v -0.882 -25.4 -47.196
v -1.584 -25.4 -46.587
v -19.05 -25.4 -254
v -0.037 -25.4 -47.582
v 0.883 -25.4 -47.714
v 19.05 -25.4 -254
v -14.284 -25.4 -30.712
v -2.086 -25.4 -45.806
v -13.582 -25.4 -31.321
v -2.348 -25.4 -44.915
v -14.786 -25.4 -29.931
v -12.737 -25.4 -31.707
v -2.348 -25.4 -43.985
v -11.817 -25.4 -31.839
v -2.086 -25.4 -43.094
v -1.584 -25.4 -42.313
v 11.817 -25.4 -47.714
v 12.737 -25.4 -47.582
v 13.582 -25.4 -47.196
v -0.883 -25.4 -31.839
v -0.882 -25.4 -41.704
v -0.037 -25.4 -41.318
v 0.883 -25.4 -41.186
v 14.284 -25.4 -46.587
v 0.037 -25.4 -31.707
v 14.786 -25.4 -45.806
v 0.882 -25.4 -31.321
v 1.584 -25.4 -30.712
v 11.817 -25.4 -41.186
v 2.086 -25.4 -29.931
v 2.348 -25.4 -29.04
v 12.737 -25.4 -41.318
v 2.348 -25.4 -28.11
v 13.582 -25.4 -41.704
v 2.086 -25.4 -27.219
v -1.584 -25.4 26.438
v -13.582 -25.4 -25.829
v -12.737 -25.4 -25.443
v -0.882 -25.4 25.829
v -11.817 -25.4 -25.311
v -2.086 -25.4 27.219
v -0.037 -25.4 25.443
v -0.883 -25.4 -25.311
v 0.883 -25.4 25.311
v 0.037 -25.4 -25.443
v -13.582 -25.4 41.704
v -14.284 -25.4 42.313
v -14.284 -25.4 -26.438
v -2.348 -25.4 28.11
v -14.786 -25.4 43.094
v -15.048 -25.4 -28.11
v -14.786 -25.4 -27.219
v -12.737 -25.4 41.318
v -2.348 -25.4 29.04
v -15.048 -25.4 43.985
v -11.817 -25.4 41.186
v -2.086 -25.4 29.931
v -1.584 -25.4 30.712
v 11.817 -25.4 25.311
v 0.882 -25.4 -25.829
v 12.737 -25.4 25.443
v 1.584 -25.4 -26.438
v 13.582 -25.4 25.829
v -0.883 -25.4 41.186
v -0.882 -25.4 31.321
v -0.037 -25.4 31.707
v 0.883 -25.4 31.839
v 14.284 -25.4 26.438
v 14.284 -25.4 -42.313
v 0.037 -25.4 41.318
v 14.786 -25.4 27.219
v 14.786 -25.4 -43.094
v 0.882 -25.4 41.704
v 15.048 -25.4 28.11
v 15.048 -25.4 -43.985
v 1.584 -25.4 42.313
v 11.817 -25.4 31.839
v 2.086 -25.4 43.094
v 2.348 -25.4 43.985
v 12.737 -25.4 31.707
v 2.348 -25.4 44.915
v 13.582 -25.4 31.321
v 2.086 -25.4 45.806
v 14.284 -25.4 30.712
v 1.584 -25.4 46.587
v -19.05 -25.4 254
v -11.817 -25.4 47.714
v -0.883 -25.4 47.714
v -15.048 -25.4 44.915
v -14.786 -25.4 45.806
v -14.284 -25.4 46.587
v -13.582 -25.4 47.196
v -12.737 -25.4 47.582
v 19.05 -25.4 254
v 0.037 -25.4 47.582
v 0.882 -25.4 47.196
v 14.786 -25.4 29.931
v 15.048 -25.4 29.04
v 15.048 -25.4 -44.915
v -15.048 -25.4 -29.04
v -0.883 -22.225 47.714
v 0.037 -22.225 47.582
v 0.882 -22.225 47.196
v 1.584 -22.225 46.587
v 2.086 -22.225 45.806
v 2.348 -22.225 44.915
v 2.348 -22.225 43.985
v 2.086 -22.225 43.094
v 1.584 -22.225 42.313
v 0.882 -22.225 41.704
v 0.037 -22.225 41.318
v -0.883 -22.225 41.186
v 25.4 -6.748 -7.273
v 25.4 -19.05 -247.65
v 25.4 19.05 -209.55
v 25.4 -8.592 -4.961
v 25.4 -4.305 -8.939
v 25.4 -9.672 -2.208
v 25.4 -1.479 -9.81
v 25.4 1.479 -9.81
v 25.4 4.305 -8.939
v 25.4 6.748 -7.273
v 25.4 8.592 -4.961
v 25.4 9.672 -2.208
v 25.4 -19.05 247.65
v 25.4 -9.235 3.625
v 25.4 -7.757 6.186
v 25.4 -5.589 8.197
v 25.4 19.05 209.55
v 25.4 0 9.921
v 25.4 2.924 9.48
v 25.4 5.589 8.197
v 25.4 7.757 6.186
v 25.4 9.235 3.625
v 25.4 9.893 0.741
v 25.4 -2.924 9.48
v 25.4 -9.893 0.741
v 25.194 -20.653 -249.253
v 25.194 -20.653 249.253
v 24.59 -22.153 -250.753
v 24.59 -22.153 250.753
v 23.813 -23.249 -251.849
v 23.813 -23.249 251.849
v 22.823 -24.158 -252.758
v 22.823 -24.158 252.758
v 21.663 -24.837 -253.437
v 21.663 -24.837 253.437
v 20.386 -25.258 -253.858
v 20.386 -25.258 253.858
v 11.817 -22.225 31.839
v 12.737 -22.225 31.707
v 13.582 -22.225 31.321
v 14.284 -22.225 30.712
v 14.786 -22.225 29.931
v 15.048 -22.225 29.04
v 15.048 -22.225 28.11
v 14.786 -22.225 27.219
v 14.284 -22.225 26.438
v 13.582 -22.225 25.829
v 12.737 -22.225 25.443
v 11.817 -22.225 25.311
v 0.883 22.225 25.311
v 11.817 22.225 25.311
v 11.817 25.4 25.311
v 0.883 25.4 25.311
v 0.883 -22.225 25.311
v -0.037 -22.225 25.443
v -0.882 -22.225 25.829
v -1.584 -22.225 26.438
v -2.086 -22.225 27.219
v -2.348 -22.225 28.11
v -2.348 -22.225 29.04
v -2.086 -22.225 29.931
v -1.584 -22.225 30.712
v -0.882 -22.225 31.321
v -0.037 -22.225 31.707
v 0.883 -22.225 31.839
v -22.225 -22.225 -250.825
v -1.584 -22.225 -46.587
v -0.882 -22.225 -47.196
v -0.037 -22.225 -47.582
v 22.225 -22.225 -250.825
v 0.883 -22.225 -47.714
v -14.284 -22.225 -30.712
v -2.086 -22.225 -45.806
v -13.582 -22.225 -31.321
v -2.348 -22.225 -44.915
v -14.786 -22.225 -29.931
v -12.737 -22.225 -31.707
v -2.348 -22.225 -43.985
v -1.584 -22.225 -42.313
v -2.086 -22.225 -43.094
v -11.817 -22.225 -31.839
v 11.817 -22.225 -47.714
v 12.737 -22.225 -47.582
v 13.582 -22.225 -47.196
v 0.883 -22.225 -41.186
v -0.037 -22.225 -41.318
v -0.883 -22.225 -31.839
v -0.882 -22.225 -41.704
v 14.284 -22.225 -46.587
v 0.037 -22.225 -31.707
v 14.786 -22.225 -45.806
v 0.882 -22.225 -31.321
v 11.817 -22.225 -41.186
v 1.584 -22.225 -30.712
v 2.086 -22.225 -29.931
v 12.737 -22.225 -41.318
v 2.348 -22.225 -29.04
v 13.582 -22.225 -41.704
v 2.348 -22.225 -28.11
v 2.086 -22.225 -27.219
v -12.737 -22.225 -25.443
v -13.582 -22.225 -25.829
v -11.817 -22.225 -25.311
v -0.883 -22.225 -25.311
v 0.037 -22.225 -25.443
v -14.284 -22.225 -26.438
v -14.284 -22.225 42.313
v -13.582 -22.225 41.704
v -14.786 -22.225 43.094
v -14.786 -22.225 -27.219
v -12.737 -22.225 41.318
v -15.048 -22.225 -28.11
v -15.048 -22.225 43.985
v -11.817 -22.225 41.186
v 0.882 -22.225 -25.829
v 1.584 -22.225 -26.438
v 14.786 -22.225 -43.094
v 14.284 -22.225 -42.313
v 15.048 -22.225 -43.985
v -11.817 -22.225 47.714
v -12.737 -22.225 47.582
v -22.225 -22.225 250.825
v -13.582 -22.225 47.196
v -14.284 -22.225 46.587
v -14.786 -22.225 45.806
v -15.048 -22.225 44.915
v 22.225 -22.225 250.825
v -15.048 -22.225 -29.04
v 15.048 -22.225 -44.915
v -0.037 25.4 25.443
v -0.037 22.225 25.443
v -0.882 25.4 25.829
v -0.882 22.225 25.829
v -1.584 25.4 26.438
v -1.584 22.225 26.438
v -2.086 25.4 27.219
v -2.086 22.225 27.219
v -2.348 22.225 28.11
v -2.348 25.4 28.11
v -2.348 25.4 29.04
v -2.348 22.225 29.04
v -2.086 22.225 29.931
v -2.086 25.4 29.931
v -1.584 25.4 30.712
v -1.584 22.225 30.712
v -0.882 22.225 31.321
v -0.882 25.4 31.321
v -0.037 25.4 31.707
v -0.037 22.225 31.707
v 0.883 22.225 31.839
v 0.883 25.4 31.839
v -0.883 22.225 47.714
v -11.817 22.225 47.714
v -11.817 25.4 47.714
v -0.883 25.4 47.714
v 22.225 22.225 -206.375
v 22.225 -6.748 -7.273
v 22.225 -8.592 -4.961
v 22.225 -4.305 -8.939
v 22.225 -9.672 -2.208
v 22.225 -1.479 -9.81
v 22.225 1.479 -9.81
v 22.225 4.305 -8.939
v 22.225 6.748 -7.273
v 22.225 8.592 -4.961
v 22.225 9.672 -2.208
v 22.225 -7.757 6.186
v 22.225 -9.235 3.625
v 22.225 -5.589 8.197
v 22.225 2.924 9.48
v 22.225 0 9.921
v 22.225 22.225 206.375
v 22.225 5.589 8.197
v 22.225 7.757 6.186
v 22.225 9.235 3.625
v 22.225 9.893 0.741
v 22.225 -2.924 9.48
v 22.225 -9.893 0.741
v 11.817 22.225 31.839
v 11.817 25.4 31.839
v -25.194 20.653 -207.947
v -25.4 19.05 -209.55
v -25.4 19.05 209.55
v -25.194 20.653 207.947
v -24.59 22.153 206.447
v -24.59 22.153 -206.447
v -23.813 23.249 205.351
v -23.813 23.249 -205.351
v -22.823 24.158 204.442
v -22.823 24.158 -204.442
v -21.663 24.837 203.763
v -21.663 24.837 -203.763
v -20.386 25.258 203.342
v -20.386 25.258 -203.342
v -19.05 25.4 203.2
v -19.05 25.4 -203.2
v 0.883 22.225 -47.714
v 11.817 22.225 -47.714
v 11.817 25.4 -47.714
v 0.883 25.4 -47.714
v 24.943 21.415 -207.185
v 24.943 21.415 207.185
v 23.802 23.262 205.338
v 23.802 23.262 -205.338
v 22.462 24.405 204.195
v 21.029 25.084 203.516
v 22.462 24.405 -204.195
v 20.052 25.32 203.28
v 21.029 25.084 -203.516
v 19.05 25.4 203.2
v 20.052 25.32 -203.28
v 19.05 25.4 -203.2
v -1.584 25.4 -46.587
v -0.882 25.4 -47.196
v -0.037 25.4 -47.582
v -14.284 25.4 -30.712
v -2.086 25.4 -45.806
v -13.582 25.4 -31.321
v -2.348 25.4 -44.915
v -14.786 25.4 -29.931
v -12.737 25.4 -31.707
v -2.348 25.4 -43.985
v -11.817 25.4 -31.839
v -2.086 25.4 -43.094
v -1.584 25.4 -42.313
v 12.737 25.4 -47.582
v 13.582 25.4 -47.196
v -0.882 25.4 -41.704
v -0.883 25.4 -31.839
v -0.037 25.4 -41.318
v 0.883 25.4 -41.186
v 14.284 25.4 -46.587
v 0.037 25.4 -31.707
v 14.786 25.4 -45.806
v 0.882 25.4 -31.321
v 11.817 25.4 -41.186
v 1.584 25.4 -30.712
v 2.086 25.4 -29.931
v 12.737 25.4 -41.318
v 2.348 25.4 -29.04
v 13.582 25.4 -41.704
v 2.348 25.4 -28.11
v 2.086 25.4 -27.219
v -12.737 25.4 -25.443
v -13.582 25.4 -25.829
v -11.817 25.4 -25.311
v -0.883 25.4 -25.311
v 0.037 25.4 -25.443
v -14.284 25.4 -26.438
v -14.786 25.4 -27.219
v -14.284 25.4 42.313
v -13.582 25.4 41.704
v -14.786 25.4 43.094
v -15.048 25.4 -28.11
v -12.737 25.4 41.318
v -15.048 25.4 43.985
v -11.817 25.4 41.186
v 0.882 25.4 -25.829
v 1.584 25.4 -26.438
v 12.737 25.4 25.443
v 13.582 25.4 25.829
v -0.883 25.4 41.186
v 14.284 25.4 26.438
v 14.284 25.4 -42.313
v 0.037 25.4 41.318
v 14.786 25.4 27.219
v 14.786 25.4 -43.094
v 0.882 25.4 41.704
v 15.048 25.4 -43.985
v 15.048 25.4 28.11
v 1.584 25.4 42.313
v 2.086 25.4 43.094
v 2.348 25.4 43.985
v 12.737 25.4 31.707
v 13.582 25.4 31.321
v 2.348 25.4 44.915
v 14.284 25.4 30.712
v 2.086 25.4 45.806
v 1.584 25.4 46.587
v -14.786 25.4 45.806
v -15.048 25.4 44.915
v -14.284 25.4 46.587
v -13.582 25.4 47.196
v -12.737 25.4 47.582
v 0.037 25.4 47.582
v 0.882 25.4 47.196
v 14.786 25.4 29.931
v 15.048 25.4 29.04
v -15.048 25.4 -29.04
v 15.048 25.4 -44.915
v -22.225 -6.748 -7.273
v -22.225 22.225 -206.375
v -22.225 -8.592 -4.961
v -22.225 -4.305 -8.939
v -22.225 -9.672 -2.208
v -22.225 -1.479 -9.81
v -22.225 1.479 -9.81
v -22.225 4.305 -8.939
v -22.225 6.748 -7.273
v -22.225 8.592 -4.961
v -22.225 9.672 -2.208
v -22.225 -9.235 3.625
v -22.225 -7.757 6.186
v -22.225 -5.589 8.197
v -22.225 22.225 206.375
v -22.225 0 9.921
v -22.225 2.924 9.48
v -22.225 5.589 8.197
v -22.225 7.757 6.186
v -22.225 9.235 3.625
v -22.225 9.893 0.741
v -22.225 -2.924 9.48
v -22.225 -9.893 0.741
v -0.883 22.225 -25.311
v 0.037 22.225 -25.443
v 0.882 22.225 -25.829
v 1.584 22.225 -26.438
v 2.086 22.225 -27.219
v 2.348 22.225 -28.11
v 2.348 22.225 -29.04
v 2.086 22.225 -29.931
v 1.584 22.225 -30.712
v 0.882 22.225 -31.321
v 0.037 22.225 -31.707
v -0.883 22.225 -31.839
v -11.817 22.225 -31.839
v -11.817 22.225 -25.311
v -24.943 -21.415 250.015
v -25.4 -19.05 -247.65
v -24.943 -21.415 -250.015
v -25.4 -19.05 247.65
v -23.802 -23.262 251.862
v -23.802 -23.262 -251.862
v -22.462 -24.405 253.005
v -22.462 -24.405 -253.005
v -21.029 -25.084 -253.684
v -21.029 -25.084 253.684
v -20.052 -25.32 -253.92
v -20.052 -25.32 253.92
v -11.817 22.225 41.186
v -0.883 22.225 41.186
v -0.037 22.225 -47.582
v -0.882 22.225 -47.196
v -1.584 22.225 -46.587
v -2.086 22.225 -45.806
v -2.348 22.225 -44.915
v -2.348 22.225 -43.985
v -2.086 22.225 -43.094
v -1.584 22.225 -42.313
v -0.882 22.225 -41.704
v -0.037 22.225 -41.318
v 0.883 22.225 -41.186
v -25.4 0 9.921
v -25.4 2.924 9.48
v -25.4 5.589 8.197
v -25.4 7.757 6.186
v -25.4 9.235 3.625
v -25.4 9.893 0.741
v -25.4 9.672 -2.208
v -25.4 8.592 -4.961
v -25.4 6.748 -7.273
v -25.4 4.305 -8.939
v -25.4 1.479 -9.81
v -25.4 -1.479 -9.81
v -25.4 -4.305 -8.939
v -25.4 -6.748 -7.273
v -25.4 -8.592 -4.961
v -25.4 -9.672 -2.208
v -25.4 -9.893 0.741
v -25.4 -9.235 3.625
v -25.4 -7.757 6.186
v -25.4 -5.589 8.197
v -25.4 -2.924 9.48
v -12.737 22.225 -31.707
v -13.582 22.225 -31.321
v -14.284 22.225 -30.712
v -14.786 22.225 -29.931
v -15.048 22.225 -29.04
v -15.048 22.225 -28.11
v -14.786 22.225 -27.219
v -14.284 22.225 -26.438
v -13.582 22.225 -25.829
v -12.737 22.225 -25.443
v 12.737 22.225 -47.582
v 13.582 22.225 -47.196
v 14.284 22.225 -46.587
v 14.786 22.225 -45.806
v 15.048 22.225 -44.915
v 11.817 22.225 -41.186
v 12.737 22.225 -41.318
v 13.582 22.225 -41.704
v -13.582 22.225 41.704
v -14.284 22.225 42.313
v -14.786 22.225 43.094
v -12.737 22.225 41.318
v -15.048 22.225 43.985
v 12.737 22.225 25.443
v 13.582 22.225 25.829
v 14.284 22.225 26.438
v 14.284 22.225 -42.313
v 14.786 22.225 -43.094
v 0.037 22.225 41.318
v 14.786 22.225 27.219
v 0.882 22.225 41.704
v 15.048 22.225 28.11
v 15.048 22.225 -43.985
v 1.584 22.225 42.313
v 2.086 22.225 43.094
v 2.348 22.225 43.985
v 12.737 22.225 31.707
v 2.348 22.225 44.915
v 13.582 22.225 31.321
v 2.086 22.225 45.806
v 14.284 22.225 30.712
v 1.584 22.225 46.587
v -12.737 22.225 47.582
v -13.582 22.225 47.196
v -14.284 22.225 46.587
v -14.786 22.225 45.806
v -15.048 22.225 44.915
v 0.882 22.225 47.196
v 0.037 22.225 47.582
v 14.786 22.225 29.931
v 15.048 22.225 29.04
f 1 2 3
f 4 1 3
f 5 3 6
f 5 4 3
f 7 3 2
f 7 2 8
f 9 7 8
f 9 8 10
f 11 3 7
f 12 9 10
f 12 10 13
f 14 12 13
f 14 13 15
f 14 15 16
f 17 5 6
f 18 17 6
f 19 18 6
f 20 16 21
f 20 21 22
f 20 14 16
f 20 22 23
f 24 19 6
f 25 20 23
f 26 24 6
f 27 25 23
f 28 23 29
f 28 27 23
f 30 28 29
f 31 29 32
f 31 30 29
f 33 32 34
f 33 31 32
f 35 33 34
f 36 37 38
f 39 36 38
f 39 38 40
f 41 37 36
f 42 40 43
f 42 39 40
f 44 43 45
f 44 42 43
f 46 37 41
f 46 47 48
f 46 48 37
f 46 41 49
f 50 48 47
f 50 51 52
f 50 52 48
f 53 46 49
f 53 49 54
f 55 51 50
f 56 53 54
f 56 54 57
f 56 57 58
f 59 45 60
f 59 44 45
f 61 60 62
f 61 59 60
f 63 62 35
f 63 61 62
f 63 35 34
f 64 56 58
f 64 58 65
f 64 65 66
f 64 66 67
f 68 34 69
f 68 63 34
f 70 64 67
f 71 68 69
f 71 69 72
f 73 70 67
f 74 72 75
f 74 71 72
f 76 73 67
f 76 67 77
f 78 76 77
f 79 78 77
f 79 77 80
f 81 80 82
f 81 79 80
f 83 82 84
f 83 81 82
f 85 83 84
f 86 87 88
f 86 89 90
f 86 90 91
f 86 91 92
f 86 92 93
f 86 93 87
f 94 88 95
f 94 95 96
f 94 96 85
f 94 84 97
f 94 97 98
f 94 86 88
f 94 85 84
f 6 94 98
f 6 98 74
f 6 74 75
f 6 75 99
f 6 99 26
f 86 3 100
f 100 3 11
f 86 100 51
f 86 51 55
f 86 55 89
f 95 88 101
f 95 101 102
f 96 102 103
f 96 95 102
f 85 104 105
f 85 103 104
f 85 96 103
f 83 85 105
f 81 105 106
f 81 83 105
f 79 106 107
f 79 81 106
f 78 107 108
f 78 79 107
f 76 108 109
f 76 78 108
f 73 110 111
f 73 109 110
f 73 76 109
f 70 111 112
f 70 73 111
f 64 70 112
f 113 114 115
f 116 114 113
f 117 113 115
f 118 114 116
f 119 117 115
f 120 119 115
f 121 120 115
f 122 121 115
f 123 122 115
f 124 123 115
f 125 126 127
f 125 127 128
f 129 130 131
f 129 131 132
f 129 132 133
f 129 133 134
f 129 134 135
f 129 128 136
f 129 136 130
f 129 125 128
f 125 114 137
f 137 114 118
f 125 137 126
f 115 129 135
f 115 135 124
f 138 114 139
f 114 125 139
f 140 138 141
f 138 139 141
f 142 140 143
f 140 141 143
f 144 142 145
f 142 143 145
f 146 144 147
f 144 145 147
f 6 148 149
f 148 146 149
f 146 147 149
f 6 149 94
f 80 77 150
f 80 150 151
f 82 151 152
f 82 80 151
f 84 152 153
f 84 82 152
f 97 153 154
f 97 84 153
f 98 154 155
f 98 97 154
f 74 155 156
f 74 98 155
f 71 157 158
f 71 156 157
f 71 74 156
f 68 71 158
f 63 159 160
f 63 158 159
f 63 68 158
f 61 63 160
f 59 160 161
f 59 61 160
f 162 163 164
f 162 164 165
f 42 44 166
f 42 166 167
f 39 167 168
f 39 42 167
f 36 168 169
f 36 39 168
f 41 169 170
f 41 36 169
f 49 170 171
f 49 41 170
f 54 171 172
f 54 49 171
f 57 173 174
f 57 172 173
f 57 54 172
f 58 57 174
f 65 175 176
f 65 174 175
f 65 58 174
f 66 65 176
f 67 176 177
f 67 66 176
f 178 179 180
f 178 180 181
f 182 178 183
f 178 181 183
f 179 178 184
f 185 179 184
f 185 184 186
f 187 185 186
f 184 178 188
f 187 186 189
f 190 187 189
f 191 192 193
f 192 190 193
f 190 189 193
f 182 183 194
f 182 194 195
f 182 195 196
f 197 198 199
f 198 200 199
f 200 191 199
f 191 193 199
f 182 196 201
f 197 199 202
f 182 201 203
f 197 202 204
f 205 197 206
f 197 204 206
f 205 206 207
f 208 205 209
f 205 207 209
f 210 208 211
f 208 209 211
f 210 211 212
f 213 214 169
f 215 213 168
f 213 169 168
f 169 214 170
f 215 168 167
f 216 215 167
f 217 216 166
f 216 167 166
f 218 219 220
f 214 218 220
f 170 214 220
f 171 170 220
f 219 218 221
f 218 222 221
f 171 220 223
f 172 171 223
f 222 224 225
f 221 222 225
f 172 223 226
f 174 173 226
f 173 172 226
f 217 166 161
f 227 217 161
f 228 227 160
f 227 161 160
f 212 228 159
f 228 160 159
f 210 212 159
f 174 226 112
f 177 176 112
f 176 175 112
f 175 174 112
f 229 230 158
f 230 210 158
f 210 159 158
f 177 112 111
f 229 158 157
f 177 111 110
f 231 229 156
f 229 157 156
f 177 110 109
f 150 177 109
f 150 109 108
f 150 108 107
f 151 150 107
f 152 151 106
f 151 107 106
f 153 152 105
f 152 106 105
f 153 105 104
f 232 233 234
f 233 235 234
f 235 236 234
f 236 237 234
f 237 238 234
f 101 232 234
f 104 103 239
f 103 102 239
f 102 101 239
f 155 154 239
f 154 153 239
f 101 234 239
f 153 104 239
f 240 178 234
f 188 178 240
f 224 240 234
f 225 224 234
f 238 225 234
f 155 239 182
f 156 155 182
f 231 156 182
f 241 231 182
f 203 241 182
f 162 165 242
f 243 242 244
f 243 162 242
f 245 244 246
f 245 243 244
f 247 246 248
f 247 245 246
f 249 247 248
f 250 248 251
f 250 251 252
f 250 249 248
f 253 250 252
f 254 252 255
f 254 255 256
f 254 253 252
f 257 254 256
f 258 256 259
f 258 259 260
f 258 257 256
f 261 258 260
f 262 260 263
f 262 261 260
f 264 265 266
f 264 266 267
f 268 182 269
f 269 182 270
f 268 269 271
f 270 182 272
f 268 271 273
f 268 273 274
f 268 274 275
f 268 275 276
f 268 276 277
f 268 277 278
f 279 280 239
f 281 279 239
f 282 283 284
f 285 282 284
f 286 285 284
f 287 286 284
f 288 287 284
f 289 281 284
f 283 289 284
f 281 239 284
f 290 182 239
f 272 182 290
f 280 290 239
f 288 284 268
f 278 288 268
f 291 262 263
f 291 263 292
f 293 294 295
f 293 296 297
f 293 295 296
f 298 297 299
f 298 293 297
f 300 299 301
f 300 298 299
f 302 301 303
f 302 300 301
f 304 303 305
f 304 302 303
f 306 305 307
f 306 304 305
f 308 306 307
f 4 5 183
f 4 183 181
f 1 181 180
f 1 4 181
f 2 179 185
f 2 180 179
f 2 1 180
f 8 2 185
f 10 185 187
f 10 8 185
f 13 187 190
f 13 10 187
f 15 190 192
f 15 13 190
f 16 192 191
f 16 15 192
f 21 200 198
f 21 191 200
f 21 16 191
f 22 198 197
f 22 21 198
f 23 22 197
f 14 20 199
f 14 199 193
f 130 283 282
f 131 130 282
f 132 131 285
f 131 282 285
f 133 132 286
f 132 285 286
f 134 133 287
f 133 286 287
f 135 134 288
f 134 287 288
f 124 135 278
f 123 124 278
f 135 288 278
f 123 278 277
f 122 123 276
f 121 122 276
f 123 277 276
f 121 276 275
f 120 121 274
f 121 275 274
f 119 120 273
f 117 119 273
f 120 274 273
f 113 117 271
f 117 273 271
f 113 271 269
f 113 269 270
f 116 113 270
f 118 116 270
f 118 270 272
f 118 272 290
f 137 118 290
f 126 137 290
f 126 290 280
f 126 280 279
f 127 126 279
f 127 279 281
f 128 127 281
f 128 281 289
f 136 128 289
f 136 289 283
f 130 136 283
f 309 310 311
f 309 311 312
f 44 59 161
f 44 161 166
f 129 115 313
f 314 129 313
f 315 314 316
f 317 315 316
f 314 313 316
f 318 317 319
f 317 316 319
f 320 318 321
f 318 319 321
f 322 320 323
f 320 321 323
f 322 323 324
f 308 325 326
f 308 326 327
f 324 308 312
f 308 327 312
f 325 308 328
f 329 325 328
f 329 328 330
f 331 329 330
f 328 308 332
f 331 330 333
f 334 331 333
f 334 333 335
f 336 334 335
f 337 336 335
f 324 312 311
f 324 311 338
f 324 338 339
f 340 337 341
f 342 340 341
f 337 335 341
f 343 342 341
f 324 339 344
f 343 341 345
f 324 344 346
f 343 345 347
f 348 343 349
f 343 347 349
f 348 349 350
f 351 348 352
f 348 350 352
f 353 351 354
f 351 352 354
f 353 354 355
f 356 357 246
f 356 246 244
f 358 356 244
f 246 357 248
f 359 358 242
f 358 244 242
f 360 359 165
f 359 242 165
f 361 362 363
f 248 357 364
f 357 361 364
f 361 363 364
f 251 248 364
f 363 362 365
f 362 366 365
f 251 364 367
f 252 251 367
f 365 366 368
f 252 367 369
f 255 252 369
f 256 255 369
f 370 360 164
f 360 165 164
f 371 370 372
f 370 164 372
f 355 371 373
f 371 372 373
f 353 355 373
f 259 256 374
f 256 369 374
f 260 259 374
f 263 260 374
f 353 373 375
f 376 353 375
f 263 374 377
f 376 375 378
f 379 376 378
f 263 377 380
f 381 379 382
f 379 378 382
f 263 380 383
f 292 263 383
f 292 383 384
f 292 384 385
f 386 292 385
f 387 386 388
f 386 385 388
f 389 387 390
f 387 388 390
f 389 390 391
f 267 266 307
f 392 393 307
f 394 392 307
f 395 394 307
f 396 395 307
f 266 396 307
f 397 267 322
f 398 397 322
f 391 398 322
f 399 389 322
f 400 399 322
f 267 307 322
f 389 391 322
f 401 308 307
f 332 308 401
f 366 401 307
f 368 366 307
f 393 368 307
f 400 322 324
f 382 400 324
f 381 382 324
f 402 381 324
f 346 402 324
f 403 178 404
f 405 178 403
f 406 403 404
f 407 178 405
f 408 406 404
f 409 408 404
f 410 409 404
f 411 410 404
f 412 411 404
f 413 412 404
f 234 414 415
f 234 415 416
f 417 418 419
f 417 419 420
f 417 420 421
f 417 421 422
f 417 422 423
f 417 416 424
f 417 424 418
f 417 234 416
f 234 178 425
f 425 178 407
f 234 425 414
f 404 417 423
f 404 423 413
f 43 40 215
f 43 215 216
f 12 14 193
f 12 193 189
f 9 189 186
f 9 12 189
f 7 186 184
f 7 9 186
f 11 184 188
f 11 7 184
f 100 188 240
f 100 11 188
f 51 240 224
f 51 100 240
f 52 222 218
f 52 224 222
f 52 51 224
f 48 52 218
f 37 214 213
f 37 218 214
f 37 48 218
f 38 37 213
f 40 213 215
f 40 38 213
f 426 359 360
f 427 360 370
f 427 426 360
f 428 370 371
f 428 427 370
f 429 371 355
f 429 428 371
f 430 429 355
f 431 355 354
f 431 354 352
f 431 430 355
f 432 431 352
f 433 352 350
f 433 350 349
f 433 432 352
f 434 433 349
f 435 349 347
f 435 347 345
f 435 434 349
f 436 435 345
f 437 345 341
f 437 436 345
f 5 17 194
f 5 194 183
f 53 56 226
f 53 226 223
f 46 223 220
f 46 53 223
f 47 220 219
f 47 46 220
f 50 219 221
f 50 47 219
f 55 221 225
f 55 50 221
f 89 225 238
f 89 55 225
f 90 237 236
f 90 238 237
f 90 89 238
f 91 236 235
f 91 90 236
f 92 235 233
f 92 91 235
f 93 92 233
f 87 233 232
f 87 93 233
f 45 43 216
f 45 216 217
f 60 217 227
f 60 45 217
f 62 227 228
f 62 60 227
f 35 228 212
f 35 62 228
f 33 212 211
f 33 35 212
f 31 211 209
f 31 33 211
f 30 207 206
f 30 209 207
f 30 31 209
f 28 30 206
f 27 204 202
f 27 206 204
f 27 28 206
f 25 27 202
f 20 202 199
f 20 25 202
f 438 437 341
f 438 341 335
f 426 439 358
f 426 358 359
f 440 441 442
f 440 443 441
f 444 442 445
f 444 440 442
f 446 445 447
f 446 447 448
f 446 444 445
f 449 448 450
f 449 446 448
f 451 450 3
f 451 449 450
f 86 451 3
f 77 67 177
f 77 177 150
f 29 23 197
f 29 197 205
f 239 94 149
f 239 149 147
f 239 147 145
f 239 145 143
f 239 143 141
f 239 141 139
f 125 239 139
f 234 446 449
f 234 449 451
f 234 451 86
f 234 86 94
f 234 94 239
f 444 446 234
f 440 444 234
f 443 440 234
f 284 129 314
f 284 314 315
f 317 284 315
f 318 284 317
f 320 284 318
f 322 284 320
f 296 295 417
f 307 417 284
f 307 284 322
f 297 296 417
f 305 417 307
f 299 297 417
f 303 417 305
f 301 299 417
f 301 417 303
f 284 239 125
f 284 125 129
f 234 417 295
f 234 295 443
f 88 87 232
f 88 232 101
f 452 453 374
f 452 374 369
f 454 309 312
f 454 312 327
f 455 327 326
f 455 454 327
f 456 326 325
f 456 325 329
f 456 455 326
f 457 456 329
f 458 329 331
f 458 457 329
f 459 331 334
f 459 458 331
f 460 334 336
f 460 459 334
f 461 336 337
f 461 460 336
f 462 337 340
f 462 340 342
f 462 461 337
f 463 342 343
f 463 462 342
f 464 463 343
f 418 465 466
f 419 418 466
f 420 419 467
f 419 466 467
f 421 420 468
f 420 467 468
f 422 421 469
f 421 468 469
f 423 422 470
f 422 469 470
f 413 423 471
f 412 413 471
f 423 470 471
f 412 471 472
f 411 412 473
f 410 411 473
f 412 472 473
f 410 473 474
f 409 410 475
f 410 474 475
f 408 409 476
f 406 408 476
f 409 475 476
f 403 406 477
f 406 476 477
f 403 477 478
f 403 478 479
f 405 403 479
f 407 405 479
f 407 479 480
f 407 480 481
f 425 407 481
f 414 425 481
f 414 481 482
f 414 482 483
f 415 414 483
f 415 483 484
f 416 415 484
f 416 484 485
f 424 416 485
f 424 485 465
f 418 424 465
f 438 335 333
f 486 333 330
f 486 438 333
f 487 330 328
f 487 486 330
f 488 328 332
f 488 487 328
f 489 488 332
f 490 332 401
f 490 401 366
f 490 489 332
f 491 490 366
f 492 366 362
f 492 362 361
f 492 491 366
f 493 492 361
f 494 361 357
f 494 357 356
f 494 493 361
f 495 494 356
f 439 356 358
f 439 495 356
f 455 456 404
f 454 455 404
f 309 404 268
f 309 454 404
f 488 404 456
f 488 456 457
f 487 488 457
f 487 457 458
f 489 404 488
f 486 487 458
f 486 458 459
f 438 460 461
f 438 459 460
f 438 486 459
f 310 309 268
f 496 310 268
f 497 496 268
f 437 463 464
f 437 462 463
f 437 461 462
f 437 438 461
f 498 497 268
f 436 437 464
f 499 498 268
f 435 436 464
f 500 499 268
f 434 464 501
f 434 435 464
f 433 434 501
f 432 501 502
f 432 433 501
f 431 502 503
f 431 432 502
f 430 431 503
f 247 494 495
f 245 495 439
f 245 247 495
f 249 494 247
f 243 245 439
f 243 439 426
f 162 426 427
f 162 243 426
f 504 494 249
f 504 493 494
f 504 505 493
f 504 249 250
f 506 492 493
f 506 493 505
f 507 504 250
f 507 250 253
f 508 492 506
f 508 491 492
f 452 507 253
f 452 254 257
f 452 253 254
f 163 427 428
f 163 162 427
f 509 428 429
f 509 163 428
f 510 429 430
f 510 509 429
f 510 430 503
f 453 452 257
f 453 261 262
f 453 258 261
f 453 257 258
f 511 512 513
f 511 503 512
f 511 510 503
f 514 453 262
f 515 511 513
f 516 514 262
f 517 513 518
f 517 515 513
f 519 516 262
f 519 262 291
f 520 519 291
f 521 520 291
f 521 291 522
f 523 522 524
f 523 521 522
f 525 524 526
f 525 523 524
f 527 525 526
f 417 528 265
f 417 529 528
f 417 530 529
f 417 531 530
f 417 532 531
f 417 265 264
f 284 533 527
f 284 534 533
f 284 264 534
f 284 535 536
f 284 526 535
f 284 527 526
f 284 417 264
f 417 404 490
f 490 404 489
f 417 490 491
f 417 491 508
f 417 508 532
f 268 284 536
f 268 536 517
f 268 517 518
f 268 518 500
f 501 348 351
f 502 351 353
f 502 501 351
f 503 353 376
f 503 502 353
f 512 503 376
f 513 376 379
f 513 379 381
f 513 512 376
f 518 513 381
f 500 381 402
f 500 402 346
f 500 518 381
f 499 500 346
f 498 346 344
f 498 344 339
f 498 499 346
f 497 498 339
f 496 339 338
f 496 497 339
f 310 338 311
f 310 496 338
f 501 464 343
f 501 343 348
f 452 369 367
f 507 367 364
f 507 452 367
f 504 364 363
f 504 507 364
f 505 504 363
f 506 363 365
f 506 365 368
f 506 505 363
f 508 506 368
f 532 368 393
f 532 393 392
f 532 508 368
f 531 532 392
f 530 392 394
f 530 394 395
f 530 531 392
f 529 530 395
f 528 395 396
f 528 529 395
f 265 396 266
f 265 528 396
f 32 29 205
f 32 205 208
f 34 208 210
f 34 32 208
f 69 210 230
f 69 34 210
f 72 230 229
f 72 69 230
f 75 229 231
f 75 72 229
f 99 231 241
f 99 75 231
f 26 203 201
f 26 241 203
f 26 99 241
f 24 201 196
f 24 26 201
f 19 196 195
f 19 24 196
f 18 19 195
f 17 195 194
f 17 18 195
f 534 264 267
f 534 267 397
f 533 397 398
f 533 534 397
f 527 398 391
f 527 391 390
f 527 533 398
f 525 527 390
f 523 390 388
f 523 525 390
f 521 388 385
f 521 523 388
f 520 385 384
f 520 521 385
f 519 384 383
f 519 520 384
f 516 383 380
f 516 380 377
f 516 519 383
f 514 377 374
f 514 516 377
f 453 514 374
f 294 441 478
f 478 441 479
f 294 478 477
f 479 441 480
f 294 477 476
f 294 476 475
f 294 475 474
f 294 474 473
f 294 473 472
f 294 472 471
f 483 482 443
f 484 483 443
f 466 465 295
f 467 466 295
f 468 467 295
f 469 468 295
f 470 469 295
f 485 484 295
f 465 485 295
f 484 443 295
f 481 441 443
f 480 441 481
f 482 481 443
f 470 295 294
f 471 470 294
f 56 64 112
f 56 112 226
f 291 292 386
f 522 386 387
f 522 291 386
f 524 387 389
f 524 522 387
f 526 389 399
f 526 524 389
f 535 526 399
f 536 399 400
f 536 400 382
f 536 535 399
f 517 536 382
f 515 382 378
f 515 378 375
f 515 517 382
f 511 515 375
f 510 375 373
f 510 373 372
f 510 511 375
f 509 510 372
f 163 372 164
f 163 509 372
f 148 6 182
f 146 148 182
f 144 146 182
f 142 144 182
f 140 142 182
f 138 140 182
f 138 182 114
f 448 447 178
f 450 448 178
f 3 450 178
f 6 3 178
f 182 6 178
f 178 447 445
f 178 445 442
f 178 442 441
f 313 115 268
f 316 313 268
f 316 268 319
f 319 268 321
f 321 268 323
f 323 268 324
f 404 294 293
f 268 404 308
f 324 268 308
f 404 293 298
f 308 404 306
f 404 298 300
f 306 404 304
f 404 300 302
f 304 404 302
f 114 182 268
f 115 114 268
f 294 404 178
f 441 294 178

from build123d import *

# Parameters (mm, degrees)
SKETCH1_W                   = 50.8
SKETCH1_H                   = 50.8
SKETCH1_W_2                 = 44.45
SKETCH1_H_2                 = 44.45
BOSS_EXTRUDE1_DEPTH         = 254
FILLET1_R                   = 6.35
CUT_EXTRUDE1_DEPTH          = 914.4
F_1_4_START                 = -25.4
F_1_4_CLEARANCE_SLOT1_DEPTH = 50.8
F_3_4_CLEARANCE_HOLE1_D     = 19.84248


# Read off the part's stored shape, not the designer's step: 1/4 Clearance Slot1
with BuildPart() as part:
    # Sketch1 → Boss-Extrude1 (new, symmetric)
    with BuildSketch(Plane.XY):
        Rectangle(SKETCH1_W, SKETCH1_H)
        Rectangle(SKETCH1_W_2, SKETCH1_H_2, mode=Mode.SUBTRACT)
    extrude(amount=BOSS_EXTRUDE1_DEPTH, both=True)

    # Fillet1
    fillet1_edges = [part.edges().sort_by_distance(p)[0] for p in [
        (-25.4, 25.4, 0),
        (25.4, 25.4, 0),
        (25.4, -25.4, 0),
        (-25.4, -25.4, 0),
    ]]
    fillet(fillet1_edges, radius=FILLET1_R)

    # Sketch2 → Cut-Extrude1 (cut)
    with BuildSketch(Plane.ZY.offset(25.4)):
        Polygon((254, -25.4), (203.2, 25.4), (254, 25.4), align=None)
        Polygon((-254, 25.4), (-254, -25.4), (-203.2, 25.4), align=None)
    extrude(amount=-CUT_EXTRUDE1_DEPTH, mode=Mode.SUBTRACT)

    # 1/4 Clearance Slot1 outline → 1/4 Clearance Slot1 (cut)
    with BuildSketch(Plane(origin=(0, 0, 0), x_dir=(1, 0, 0), z_dir=(0, 1, 0)).offset(F_1_4_START)):
        with BuildLine():
            ThreePointArc((-0.88265, -47.7139), (2.38125, -44.45), (-0.88265, -41.1861))
            Line((-0.88265, -41.1861), (-11.81735, -41.1861))
            ThreePointArc((-11.81735, -41.1861), (-15.08125, -44.45), (-11.81735, -47.7139))
            Line((-11.81735, -47.7139), (-0.88265, -47.7139))
        make_face()
        with BuildLine():
            ThreePointArc((11.81735, -31.8389), (15.08125, -28.575), (11.81735, -25.3111))
            Line((11.81735, -25.3111), (0.88265, -25.3111))
            ThreePointArc((0.88265, -25.3111), (-2.38125, -28.575), (0.88265, -31.8389))
            Line((0.88265, -31.8389), (11.81735, -31.8389))
        make_face()
        with BuildLine():
            ThreePointArc((-0.88265, 25.3111), (2.38125, 28.575), (-0.88265, 31.8389))
            Line((-0.88265, 31.8389), (-11.81735, 31.8389))
            ThreePointArc((-11.81735, 31.8389), (-15.08125, 28.575), (-11.81735, 25.3111))
            Line((-11.81735, 25.3111), (-0.88265, 25.3111))
        make_face()
        with BuildLine():
            Line((0.88265, 41.1861), (11.81735, 41.1861))
            ThreePointArc((11.81735, 41.1861), (15.08125, 44.45), (11.81735, 47.7139))
            Line((11.81735, 47.7139), (0.88265, 47.7139))
            ThreePointArc((0.88265, 47.7139), (-2.38125, 44.45), (0.88265, 41.1861))
        make_face()
    extrude(amount=F_1_4_CLEARANCE_SLOT1_DEPTH, mode=Mode.SUBTRACT)

    # 3/4 Clearance Hole1 (through all)
    with Locations(Plane(origin=(25.4, 0, 0), x_dir=(0, 0, -1), z_dir=(1, 0, 0))):
        with Locations((0, 0)):
            Hole(F_3_4_CLEARANCE_HOLE1_D / 2)


solid = part.part
